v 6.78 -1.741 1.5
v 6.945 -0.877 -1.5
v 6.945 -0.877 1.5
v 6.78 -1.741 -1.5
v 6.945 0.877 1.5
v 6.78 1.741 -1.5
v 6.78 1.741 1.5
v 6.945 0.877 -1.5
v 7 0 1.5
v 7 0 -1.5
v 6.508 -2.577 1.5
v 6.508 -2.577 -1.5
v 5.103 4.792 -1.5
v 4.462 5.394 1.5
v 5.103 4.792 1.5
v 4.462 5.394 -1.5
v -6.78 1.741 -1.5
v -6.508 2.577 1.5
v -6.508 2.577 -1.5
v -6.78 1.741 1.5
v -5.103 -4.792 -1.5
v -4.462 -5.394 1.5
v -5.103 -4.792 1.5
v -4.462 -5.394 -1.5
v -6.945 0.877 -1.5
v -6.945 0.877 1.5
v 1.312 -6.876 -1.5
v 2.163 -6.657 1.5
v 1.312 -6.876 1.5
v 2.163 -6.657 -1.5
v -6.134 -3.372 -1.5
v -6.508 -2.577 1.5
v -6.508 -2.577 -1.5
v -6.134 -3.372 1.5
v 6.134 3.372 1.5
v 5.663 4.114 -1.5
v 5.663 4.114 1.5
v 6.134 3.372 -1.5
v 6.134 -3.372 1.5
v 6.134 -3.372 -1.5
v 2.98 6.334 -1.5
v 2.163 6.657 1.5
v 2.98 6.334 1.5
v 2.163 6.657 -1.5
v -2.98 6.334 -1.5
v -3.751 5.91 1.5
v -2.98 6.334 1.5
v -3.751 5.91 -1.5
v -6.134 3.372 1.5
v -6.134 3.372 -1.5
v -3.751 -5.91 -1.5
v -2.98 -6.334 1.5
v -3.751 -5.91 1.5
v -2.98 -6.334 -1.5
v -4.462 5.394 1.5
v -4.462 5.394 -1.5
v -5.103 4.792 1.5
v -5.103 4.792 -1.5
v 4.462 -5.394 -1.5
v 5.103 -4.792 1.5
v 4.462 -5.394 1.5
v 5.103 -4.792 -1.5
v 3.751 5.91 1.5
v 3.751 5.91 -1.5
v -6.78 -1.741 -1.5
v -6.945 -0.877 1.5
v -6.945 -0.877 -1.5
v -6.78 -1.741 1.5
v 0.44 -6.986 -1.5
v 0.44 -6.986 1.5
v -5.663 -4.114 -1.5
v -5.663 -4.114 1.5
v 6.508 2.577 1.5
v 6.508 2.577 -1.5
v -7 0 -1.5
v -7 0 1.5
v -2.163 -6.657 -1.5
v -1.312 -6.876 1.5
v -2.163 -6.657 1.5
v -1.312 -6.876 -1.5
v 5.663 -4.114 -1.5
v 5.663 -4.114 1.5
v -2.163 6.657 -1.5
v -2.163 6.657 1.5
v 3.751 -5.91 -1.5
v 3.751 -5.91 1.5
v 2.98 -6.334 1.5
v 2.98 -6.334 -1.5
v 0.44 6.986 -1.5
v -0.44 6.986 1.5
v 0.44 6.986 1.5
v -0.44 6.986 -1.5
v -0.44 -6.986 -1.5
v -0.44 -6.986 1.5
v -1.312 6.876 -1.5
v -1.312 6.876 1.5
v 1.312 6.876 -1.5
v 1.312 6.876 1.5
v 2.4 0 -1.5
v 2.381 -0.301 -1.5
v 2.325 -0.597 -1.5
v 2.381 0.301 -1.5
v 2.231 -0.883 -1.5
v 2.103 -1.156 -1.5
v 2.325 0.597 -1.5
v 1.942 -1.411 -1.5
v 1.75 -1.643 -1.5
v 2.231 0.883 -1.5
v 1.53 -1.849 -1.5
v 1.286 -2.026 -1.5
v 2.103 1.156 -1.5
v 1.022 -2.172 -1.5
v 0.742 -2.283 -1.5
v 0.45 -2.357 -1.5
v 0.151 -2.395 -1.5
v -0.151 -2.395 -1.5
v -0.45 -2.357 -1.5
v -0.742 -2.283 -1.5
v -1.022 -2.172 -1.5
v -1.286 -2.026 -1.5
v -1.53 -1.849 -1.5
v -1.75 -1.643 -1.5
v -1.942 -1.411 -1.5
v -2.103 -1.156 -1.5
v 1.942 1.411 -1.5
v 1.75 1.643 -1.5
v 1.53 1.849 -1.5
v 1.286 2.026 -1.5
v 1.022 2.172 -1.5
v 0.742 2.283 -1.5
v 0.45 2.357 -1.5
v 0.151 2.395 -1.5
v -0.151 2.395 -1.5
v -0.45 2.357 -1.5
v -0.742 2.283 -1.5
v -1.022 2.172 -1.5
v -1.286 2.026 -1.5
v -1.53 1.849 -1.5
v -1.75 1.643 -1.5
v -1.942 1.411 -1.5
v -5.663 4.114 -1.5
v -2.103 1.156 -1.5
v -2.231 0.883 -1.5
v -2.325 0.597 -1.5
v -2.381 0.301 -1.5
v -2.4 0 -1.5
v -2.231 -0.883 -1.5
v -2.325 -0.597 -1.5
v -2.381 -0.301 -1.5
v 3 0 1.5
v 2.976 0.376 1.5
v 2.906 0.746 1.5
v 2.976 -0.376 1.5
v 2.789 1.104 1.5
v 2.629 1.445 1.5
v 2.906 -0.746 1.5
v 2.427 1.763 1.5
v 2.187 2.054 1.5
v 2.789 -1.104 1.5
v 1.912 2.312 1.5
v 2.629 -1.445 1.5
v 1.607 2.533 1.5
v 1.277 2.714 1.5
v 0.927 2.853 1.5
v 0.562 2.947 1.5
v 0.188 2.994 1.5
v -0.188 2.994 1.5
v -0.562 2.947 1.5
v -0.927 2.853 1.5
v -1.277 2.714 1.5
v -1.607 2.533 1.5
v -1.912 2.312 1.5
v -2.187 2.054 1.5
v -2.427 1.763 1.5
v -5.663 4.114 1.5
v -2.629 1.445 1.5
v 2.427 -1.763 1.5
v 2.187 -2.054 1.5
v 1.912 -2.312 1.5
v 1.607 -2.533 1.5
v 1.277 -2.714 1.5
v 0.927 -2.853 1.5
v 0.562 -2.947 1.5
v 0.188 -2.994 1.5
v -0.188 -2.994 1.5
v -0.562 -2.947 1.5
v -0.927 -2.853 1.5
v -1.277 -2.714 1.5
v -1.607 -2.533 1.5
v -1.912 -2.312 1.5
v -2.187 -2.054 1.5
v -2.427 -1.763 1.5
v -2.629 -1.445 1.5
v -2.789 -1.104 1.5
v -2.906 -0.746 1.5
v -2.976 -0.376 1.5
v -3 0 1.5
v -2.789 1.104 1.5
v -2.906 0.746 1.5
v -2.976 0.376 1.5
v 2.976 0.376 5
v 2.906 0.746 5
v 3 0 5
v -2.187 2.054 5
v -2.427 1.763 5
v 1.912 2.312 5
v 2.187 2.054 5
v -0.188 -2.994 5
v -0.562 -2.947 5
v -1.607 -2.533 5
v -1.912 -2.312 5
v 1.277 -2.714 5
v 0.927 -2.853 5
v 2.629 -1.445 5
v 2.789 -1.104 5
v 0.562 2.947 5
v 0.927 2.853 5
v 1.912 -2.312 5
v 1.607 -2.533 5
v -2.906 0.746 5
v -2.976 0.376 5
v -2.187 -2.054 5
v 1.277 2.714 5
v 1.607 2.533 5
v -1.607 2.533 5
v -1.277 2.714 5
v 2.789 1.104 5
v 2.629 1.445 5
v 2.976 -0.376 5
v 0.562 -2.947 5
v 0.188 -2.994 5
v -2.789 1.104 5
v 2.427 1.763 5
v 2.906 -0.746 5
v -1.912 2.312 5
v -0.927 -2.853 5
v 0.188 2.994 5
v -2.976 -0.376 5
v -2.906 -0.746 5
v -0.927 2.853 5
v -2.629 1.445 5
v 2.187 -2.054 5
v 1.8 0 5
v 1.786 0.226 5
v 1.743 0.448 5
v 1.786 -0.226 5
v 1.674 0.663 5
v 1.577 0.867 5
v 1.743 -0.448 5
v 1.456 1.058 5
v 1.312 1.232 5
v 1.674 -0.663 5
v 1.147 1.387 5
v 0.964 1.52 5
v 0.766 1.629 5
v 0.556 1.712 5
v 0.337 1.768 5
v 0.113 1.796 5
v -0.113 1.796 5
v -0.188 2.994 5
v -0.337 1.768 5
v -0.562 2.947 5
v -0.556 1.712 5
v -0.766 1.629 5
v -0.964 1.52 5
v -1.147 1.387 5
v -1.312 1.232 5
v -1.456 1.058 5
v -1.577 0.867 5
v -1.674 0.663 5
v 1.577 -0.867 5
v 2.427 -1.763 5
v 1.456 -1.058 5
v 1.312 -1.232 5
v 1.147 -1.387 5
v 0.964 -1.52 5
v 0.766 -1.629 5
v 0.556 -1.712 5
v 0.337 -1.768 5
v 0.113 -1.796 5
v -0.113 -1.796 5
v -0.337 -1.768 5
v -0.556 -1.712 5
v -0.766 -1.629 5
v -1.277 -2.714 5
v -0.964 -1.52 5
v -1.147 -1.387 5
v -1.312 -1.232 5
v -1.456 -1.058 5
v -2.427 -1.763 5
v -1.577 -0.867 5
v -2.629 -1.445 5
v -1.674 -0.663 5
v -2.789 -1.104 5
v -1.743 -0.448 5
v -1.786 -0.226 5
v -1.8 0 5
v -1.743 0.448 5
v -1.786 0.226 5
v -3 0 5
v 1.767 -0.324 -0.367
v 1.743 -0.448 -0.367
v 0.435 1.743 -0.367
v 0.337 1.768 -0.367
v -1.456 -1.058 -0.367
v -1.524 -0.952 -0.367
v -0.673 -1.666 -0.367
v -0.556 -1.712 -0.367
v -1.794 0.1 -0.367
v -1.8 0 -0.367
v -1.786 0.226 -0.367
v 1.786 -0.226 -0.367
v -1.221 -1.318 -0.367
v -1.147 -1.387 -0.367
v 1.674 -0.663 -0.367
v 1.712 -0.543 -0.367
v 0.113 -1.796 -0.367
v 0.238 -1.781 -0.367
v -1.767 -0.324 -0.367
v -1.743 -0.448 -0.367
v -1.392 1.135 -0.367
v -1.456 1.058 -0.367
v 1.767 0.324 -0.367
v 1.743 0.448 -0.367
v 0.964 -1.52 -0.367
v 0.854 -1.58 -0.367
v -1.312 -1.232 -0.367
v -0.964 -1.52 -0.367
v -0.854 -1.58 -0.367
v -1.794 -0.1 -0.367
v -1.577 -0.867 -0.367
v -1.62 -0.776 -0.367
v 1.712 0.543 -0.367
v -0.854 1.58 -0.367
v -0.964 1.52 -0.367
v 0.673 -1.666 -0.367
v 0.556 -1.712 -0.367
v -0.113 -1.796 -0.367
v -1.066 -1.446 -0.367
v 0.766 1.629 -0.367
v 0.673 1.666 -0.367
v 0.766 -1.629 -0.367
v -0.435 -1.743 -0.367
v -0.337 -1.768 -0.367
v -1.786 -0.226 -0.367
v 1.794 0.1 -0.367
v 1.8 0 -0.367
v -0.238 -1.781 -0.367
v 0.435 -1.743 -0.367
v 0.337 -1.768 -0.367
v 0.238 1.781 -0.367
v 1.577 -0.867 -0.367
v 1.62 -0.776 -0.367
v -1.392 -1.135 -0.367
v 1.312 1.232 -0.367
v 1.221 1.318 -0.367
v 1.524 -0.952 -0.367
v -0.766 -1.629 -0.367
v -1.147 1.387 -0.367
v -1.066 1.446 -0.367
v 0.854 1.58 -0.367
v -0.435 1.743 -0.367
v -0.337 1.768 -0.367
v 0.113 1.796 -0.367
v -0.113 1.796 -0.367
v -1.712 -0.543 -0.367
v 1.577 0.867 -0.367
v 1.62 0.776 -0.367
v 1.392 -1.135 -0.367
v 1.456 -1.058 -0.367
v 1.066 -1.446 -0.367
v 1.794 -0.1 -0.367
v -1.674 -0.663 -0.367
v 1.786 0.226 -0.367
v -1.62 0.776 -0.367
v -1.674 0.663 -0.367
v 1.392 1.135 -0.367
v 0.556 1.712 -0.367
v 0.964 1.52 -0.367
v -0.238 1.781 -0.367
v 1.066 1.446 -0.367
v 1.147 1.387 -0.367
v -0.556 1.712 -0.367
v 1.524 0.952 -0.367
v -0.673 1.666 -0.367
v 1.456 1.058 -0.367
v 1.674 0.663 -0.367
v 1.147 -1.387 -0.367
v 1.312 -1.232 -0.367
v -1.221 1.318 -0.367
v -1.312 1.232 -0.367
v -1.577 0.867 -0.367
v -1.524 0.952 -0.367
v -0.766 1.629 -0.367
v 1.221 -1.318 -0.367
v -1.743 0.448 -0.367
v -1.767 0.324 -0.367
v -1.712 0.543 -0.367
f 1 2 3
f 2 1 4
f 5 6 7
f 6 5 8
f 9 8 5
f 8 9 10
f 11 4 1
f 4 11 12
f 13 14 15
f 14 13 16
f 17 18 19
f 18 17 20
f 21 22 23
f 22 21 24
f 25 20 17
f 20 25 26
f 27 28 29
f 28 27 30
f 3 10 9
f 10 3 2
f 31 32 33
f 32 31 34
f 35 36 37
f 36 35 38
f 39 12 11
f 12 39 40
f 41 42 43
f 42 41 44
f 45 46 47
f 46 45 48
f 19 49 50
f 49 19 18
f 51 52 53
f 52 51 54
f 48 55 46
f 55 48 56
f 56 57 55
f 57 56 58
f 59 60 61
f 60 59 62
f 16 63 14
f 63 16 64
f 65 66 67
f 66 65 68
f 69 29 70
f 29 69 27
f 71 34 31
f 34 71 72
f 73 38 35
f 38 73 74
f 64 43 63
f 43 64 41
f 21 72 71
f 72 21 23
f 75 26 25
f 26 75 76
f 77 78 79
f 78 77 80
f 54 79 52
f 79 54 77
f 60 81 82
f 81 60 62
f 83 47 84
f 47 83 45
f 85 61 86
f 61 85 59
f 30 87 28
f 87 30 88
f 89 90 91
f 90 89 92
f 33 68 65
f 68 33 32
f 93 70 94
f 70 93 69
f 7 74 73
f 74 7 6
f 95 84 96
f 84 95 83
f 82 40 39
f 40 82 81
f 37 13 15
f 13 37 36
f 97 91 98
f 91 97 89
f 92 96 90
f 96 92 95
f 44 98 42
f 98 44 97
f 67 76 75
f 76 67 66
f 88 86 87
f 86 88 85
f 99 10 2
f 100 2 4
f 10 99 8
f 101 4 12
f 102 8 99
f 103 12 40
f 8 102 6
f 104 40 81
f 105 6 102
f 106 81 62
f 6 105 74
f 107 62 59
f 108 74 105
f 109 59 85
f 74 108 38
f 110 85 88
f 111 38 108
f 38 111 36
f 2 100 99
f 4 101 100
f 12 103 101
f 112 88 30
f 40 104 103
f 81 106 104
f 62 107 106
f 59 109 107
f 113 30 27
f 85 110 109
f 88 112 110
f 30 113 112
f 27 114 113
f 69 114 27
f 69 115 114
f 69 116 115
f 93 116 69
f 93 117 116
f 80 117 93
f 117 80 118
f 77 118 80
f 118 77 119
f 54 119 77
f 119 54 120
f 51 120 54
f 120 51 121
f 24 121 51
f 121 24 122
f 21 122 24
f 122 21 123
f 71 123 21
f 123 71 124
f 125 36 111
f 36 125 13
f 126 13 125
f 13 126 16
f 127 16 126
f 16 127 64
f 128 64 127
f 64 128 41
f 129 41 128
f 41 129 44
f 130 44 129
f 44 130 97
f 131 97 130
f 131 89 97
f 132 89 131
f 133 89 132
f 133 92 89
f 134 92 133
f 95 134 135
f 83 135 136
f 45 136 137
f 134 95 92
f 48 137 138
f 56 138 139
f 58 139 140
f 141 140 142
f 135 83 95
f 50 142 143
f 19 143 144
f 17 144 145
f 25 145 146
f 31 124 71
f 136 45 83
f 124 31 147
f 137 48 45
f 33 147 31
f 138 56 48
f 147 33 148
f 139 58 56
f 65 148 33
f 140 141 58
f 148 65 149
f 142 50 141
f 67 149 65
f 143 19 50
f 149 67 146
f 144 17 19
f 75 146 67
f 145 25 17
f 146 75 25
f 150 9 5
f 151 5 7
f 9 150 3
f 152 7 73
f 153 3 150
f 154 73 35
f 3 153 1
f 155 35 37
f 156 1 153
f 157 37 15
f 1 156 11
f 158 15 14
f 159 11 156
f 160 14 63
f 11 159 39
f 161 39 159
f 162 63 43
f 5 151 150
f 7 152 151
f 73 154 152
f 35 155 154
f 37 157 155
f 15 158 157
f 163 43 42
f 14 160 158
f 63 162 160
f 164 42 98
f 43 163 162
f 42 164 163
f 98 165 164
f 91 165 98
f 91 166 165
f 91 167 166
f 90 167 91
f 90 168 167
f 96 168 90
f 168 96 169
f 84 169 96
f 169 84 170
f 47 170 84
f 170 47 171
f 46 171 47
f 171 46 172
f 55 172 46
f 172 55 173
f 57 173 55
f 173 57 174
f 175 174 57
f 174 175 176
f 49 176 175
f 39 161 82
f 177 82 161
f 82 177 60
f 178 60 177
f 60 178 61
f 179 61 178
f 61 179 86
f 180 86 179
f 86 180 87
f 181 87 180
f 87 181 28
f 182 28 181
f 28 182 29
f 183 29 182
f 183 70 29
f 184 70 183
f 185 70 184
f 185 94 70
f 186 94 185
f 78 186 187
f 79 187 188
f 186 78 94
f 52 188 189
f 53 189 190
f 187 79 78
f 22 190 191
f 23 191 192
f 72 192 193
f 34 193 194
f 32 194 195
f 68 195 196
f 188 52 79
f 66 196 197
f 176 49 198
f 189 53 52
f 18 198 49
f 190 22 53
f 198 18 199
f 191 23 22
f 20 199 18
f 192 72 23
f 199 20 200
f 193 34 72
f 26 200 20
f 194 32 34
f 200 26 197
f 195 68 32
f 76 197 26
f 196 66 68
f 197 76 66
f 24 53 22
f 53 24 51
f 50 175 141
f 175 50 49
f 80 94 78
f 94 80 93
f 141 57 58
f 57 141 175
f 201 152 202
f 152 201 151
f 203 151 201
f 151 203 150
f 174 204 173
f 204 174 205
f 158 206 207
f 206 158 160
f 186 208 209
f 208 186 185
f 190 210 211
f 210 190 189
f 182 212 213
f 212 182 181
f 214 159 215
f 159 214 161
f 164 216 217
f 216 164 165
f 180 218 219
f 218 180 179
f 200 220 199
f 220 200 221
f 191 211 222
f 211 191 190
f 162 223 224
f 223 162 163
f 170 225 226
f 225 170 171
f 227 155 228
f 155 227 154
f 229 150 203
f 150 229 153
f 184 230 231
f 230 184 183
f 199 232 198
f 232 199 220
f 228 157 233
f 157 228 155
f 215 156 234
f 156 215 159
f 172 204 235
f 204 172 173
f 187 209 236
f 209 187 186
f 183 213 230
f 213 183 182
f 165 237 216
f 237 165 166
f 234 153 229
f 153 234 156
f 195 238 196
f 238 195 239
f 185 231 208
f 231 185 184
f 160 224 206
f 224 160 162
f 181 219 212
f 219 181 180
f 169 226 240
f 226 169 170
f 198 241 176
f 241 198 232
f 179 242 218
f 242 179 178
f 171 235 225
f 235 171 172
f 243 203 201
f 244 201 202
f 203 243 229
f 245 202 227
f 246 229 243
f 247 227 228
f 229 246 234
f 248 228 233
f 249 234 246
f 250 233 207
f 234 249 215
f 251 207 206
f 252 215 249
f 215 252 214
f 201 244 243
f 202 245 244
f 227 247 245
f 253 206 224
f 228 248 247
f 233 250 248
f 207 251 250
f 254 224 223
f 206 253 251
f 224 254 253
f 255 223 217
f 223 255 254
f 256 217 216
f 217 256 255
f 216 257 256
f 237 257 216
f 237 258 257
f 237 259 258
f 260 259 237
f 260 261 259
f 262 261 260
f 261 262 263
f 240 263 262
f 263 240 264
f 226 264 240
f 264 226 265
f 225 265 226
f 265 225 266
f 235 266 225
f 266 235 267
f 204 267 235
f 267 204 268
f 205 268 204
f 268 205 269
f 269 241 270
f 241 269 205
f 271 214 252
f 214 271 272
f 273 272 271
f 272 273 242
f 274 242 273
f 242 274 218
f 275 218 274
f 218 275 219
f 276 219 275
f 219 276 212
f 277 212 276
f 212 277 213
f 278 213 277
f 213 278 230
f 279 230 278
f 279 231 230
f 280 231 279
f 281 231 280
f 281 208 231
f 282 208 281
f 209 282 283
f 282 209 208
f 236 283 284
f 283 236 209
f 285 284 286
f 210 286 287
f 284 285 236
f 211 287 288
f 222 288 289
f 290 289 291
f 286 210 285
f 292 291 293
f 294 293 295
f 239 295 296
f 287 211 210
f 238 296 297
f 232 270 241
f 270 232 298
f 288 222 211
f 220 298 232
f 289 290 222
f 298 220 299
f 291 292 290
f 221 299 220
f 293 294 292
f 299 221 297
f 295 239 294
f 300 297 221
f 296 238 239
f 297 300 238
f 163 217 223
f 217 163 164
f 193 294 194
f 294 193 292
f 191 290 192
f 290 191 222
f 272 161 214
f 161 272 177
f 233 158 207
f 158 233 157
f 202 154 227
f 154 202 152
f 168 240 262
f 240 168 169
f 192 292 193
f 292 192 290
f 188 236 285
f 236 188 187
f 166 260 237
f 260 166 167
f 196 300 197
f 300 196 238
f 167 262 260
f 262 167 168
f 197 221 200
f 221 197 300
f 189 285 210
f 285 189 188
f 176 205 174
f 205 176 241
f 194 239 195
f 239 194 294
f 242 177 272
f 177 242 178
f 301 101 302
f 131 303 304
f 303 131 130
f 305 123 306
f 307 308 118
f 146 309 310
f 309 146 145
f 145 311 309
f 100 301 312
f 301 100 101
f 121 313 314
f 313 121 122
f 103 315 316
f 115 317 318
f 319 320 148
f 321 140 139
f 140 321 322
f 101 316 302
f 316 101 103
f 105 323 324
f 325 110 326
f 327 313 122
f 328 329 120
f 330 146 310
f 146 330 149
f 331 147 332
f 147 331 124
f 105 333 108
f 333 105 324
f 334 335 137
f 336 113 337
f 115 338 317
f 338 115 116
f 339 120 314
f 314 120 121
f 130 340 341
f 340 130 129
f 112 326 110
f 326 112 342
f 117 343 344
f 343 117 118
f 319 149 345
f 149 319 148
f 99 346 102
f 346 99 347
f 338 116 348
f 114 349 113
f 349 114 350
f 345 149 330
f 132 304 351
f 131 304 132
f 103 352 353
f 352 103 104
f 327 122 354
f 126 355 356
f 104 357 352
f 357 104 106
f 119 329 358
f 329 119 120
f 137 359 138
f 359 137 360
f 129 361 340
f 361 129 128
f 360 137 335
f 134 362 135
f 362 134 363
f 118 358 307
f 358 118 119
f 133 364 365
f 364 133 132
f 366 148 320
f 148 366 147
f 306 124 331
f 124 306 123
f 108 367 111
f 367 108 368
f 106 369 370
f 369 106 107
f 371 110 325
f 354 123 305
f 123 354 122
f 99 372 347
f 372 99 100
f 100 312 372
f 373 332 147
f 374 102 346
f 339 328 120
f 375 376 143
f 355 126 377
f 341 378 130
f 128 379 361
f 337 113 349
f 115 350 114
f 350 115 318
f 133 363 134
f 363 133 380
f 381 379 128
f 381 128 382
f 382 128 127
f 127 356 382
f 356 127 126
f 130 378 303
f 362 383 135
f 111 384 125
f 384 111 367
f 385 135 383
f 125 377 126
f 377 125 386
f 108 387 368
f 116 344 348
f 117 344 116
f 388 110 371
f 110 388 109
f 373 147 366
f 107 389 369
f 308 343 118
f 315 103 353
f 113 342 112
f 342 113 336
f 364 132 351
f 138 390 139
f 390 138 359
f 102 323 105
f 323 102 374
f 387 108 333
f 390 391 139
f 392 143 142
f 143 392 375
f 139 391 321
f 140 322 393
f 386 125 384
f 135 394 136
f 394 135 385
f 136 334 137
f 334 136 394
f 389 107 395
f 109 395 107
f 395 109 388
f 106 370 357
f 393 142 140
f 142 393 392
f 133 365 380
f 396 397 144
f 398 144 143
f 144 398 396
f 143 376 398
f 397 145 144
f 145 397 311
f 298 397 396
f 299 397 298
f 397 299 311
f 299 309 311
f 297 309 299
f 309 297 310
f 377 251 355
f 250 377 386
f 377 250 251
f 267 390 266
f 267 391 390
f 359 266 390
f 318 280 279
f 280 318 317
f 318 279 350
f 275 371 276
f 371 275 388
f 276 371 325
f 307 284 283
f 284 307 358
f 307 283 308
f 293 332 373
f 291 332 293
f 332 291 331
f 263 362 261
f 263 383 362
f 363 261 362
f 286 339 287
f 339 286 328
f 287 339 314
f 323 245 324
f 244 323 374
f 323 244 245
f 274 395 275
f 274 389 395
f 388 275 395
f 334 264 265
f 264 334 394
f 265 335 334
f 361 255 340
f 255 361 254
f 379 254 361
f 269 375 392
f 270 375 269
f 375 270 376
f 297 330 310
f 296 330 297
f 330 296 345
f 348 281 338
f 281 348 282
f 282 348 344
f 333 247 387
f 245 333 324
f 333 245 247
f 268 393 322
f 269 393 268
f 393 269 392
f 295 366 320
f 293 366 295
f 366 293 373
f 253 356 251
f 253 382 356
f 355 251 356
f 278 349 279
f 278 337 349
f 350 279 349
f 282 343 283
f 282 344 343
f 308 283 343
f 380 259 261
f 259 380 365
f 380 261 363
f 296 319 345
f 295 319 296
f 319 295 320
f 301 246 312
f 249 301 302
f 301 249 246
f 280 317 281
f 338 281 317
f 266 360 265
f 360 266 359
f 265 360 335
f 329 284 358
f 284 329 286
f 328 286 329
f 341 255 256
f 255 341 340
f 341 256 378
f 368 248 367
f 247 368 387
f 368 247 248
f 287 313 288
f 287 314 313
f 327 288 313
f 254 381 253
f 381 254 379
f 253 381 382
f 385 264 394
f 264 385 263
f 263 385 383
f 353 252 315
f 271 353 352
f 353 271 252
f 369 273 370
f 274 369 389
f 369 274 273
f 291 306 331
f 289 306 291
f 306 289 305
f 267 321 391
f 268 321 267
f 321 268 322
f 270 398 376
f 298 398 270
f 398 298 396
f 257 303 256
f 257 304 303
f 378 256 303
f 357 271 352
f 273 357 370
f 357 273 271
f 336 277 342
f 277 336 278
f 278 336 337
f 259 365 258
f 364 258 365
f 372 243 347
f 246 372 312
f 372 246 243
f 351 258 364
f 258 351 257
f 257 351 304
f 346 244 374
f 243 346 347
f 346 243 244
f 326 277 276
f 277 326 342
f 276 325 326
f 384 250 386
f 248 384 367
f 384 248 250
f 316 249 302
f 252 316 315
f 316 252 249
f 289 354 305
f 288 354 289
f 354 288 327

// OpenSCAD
$fn = 50;


difference() {
	union() {
		translate(v = [0, 0, -1.5000000000]) {
			cylinder(h = 3, r = 7.0000000000);
		}
		translate(v = [0, 0, -1.5000000000]) {
			cylinder(h = 6.5000000000, r = 3.0000000000);
		}
	}
	union() {
		translate(v = [0, 0, -1.5000000000]) {
			rotate(a = [0, 180, 0]) {
				difference() {
					union() {
						translate(v = [0, 0, -1.7000000000]) {
							cylinder(h = 1.7000000000, r1 = 1.5000000000, r2 = 2.4000000000);
						}
						translate(v = [0, 0, -6.5000000000]) {
							cylinder(h = 6.5000000000, r = 1.5000000000);
						}
						translate(v = [0, 0, -6.5000000000]) {
							cylinder(h = 6.5000000000, r = 1.8000000000);
						}
						translate(v = [0, 0, -6.5000000000]) {
							cylinder(h = 6.5000000000, r = 1.5000000000);
						}
					}
					union();
				}
			}
		}
		translate(v = [0, 0, -50.0000000000]) {
			cylinder(h = 100, r = 1.5000000000);
		}
	}
}
